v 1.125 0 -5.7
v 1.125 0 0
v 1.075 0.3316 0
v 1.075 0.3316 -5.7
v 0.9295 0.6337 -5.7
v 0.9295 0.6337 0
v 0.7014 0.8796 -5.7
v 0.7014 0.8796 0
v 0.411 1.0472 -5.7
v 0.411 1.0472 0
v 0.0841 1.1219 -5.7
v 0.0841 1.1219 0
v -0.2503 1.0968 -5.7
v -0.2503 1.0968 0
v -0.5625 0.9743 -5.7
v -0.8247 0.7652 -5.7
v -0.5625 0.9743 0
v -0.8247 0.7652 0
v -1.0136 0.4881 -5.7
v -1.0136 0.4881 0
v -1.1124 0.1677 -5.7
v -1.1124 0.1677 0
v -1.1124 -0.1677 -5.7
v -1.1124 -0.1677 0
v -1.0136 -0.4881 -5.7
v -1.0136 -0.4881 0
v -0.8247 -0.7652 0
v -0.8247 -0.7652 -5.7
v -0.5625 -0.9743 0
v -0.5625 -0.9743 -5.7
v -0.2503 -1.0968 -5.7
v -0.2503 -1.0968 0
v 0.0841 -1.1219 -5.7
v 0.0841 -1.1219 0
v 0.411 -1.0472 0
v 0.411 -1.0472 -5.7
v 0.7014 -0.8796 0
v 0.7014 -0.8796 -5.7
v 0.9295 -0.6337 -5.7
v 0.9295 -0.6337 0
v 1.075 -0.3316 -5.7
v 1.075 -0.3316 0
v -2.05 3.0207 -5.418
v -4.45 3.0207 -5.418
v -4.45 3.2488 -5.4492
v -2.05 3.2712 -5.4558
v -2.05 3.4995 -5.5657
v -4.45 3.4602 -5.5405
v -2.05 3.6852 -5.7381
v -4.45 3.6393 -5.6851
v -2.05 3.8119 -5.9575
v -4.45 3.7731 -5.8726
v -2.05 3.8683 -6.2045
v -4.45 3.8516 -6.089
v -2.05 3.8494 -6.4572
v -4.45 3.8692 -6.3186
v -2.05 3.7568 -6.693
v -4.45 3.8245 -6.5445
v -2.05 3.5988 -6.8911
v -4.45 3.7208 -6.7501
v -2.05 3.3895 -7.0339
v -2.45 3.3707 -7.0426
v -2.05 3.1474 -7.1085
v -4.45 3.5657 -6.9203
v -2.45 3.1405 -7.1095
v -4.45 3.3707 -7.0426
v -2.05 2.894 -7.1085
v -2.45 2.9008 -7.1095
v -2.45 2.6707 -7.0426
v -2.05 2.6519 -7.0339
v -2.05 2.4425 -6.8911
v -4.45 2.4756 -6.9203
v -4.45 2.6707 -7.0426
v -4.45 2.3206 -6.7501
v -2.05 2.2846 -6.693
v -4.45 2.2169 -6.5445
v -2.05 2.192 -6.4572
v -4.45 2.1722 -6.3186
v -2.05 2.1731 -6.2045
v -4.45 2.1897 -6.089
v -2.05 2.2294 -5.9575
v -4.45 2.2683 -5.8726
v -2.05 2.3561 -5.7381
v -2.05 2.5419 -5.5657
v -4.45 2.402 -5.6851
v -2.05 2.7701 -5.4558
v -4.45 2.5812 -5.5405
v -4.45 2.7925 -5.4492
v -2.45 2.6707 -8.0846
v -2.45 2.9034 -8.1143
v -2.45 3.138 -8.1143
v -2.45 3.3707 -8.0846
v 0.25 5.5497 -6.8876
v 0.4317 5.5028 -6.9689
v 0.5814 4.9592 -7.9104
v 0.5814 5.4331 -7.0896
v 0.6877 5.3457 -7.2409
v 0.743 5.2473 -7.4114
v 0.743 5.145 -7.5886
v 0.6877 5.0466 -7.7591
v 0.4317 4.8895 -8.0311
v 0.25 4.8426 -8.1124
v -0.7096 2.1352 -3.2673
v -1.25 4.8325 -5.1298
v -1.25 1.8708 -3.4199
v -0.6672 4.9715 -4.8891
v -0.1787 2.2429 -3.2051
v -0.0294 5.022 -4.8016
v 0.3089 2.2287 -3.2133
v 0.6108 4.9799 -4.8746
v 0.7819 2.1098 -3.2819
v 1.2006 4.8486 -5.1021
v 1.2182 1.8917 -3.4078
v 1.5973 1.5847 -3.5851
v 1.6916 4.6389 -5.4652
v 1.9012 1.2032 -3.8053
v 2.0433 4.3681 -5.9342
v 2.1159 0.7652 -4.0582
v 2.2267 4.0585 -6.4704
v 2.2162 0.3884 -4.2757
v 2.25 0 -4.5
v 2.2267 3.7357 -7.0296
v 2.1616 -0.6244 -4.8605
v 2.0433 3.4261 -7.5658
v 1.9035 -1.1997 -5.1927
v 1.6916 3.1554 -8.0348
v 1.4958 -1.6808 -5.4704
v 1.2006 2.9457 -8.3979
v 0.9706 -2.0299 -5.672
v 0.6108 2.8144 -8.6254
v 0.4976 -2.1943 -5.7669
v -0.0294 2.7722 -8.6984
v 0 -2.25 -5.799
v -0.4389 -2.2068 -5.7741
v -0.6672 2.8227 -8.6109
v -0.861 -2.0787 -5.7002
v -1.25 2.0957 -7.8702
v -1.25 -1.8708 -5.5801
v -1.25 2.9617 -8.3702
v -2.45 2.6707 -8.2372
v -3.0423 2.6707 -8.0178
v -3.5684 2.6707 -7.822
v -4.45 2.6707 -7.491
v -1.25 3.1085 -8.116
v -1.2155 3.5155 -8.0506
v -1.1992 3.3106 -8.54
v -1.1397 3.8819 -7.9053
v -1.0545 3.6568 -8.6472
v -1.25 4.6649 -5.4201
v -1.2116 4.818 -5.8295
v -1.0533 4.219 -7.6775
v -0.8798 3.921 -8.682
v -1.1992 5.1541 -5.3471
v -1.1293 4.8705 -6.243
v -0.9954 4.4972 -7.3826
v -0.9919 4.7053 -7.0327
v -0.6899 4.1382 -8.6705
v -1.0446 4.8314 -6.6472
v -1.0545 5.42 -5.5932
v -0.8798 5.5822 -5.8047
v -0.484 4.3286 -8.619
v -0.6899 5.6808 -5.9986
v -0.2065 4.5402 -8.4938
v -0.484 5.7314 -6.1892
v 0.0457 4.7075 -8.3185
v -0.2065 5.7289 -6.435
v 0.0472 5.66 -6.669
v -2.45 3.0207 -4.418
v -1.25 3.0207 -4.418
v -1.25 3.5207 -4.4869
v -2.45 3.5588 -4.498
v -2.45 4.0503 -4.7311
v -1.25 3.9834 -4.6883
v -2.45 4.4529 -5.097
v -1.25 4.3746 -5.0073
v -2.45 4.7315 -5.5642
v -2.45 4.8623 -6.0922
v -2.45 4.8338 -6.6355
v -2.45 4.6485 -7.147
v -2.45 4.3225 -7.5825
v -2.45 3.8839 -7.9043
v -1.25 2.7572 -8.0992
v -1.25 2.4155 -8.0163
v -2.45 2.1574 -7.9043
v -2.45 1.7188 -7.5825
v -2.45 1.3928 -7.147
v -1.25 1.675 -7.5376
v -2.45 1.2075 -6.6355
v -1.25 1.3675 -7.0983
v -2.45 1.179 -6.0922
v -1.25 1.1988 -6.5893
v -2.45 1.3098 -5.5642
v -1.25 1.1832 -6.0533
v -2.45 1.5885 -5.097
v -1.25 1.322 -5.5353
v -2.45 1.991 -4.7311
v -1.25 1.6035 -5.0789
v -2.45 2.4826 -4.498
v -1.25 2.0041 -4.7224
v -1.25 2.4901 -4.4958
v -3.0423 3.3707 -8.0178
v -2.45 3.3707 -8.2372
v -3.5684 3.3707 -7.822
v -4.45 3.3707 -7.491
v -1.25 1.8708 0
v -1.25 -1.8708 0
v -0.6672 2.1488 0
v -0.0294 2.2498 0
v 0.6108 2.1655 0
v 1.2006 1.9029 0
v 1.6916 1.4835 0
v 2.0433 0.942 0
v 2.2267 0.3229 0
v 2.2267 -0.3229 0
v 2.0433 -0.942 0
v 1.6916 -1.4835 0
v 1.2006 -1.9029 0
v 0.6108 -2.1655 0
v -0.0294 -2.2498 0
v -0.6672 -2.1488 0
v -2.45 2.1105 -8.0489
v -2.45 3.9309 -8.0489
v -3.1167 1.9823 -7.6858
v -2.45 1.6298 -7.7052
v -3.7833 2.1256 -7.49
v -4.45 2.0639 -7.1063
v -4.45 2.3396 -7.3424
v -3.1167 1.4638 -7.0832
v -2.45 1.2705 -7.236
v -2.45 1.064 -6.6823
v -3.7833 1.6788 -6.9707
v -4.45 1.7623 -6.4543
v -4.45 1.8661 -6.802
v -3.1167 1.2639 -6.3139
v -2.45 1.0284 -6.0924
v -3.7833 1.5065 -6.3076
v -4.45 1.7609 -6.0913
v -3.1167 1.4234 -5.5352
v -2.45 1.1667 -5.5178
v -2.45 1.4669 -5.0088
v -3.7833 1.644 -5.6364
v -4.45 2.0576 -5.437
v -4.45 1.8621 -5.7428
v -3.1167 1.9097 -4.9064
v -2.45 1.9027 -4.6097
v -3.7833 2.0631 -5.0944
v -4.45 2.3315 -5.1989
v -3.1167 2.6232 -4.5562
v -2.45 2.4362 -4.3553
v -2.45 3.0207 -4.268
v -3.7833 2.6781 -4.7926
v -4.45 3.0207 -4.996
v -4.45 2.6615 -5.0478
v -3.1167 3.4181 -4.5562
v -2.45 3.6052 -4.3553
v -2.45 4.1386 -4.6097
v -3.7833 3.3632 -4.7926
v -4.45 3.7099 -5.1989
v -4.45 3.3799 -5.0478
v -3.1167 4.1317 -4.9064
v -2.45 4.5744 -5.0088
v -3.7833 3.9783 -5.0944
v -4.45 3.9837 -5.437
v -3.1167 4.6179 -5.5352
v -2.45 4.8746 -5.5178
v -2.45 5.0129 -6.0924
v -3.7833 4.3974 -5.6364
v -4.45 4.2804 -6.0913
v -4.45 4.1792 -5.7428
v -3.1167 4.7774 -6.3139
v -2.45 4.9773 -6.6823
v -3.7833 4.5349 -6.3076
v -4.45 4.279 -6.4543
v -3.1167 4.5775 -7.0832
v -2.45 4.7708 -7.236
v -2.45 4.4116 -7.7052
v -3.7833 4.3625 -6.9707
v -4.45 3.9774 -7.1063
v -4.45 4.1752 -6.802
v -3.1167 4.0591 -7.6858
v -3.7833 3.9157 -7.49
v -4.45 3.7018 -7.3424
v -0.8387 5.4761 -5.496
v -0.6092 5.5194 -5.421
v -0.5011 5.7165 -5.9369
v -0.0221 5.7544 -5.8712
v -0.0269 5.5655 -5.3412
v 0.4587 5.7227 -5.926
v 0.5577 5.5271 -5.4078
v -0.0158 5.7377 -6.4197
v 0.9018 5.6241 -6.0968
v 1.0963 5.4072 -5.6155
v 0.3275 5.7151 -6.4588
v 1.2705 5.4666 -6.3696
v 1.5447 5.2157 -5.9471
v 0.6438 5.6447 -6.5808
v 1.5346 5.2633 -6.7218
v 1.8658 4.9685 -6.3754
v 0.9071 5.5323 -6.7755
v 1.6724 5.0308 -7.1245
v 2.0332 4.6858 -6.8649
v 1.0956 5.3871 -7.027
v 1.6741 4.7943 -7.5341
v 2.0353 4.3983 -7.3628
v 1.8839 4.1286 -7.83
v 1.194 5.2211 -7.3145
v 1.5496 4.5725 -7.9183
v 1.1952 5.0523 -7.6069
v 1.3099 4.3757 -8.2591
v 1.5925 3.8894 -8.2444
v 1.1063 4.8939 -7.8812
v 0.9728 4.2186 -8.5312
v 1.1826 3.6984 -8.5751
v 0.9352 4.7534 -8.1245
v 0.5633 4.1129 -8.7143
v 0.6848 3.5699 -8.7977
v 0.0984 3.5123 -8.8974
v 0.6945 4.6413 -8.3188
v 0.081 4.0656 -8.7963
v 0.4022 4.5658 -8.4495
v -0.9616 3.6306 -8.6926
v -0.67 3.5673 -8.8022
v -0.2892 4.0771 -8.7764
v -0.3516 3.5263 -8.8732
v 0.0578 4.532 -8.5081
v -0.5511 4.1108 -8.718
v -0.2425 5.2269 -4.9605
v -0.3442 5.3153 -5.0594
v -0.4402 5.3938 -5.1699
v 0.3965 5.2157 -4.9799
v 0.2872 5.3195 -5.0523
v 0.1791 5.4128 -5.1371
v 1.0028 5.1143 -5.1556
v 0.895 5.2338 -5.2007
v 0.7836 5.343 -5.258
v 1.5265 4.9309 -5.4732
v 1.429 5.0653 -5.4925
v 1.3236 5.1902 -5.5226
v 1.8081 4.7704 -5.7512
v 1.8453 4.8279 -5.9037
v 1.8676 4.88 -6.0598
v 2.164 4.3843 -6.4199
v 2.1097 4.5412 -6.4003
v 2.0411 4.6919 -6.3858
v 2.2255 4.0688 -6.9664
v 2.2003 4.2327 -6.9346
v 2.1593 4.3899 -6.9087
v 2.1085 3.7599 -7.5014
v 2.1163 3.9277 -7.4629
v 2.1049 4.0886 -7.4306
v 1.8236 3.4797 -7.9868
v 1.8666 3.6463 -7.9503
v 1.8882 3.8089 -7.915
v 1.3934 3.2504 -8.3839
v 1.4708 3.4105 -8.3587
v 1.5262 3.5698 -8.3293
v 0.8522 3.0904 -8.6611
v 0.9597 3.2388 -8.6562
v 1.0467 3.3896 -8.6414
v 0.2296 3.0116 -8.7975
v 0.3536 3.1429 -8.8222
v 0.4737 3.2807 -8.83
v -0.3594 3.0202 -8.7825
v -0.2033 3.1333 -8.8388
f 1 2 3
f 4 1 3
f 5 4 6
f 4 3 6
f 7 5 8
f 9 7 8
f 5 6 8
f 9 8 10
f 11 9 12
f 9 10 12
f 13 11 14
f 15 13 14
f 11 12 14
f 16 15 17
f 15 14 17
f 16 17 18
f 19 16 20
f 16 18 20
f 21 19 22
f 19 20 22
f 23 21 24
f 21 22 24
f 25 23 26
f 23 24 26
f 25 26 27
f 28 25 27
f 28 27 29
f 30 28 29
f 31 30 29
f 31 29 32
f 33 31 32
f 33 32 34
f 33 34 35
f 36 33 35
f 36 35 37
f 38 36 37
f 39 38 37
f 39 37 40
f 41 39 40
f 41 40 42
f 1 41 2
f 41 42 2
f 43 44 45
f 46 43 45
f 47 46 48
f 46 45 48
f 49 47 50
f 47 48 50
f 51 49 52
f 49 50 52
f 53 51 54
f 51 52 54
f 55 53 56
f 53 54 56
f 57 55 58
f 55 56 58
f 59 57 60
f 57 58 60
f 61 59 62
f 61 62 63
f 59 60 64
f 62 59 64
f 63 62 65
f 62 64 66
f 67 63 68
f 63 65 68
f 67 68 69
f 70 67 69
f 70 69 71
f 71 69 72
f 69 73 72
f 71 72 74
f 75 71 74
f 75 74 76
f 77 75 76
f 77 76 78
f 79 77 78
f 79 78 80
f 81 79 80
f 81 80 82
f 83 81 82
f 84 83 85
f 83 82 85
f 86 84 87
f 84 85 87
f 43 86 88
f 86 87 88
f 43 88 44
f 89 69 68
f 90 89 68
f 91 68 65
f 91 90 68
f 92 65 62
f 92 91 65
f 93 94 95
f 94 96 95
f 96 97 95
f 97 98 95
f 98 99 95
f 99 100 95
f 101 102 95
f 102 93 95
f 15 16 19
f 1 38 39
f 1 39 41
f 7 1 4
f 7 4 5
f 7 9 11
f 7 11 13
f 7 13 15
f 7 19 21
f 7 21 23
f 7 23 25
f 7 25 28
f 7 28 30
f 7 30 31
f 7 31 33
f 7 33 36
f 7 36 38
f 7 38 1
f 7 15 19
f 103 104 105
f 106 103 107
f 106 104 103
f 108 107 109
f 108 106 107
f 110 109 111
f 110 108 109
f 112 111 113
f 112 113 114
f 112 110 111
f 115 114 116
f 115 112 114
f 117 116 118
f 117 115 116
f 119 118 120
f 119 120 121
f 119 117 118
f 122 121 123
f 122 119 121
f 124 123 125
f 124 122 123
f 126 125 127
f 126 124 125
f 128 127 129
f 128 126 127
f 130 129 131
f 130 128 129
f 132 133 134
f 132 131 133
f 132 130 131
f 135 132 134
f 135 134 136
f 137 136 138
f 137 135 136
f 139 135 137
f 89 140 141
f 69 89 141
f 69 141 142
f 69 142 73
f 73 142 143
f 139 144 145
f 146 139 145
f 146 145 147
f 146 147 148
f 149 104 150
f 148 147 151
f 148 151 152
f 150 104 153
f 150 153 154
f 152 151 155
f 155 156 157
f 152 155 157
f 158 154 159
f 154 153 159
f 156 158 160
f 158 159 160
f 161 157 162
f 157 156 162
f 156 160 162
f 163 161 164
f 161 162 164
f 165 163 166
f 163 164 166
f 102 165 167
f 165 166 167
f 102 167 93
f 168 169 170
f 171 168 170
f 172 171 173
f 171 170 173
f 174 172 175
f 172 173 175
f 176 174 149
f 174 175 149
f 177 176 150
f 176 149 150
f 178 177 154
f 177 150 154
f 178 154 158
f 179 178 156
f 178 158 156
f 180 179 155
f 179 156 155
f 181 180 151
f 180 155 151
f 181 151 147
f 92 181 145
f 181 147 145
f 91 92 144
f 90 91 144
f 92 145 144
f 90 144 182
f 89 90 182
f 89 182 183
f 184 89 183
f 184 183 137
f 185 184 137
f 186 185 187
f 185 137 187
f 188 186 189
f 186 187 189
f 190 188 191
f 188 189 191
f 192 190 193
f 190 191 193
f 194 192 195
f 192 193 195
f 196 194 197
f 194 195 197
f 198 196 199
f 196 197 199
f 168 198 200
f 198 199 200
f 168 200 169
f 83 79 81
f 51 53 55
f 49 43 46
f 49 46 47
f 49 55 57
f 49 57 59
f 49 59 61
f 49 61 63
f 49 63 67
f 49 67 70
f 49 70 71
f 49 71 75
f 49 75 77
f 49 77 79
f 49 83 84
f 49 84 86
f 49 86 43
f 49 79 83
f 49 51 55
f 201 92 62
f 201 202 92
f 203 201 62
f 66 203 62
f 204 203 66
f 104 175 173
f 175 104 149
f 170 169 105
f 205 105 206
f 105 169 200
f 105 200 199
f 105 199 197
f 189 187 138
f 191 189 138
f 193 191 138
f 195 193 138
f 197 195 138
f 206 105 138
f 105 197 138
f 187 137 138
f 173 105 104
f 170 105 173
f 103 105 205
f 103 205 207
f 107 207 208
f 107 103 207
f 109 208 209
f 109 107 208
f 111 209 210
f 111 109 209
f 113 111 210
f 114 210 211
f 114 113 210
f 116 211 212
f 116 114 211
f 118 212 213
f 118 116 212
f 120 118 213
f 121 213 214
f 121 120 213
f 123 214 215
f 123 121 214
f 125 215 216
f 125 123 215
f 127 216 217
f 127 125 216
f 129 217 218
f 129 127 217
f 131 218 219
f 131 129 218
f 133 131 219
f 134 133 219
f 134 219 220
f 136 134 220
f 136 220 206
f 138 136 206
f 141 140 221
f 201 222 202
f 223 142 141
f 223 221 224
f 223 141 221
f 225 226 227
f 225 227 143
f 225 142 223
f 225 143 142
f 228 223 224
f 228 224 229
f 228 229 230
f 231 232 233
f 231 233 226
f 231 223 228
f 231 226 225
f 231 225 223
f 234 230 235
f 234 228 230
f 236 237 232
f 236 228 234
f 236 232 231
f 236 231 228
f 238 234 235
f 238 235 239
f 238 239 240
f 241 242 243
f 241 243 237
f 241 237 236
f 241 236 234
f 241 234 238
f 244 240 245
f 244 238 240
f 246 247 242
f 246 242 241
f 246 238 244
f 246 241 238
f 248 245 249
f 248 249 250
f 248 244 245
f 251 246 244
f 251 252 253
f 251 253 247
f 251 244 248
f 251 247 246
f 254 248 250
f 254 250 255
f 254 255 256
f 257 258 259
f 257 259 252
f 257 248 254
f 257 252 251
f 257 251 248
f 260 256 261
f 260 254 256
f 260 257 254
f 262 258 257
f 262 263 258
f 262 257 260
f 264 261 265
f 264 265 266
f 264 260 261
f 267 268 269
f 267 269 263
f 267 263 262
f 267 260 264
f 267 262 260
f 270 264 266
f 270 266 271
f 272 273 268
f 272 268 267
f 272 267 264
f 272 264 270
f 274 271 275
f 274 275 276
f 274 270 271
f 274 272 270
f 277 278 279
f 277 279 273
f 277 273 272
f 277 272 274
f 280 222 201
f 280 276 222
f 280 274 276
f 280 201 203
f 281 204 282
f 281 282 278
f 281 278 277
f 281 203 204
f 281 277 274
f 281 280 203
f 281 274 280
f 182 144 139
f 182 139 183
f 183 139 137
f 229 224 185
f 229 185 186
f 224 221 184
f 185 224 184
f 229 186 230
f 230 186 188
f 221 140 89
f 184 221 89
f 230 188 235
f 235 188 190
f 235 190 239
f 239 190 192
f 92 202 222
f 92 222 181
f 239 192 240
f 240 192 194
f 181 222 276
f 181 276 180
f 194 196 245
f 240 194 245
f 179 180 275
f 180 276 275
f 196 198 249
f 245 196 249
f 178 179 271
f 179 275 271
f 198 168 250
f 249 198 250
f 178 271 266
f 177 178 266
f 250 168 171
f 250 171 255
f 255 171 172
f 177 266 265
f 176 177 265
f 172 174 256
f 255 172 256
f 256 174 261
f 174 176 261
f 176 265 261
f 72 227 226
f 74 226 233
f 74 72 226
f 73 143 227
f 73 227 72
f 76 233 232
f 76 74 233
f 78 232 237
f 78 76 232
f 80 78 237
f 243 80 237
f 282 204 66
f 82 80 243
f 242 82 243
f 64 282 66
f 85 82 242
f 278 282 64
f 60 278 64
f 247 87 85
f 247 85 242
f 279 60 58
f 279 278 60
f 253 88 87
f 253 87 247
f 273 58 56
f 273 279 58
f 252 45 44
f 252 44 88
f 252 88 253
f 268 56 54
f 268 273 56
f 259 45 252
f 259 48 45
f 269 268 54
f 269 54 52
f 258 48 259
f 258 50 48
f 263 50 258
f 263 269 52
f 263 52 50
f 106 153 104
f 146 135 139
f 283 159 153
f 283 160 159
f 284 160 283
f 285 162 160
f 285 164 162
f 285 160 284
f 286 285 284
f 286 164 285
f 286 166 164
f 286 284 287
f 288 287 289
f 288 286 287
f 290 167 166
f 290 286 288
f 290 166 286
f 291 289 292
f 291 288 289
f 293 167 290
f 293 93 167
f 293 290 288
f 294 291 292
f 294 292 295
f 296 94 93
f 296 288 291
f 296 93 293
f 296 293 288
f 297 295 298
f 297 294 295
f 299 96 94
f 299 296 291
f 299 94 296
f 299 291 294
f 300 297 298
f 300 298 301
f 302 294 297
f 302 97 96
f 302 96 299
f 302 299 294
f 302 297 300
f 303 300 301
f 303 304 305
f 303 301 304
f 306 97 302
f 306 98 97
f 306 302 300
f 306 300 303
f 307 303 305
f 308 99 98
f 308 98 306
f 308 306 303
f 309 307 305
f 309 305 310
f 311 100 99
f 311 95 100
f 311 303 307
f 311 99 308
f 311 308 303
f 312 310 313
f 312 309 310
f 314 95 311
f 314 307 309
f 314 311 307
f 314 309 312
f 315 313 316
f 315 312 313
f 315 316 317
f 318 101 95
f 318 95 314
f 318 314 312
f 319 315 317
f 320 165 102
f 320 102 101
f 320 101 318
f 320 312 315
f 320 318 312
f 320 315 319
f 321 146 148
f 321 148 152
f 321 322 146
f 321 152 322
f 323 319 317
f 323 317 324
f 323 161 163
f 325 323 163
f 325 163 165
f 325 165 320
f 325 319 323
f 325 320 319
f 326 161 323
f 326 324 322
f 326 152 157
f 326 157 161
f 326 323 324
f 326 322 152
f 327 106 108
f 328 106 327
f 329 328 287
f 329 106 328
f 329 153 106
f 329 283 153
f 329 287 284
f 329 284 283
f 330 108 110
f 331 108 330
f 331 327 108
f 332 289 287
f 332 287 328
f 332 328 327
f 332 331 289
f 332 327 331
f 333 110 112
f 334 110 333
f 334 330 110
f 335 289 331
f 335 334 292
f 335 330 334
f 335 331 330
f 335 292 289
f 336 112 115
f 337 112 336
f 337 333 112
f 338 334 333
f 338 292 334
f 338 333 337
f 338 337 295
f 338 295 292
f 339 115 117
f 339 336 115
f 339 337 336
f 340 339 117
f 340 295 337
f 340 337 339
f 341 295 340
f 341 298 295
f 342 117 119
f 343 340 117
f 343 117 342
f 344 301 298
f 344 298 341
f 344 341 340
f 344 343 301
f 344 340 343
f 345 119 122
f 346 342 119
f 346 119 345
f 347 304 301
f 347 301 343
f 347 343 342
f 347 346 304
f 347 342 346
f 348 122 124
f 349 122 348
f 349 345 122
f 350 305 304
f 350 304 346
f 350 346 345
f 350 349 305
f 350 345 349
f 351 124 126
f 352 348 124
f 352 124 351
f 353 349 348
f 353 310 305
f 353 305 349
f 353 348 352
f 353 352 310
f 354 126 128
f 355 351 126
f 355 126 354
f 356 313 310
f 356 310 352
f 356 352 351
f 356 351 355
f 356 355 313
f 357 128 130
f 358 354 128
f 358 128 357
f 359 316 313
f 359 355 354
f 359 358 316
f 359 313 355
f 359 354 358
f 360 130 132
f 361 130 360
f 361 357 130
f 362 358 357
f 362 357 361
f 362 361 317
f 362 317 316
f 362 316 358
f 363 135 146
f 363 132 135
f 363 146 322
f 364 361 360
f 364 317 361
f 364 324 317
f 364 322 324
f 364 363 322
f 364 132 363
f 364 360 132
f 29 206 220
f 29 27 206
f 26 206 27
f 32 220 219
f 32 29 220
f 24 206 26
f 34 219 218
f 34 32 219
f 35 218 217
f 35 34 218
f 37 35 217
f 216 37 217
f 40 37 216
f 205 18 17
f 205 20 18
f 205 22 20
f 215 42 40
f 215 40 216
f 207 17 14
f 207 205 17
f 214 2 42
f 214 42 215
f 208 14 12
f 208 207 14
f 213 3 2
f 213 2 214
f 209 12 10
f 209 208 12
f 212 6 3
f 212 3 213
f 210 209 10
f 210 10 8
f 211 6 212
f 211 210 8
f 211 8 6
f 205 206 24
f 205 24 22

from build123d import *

# Parameters (mm, degrees)
FILLET1_R                       = 1.5
SKETCH3_R                       = 1.125
CUT_EXTRUDE1_DEPTH              = 5.7
SKETCH4_R                       = 1.85
BOSS_EXTRUDE1_DEPTH             = 1.2
BOSS_EXTRUDE1_DIRECTION_2_REACH = 13.17
SKETCH5_R                       = 2
BOSS_EXTRUDE2_DEPTH             = 2
BOSS_EXTRUDE2_TAPER             = 20
SKETCH8_R                       = 0.85
CUT_EXTRUDE2_DEPTH              = 2.4
SKETCH7_W                       = 2
SKETCH7_H                       = 0.7
CUT_EXTRUDE5_DEPTH              = 1.7


with BuildPart() as part:
    # Sweep1: sweep along a path in Sketch2
    with BuildLine(Plane(origin=(0, 0, 0), x_dir=(0, 0, -1), z_dir=(1, 0, 0))) as sweep1_path:
        Line((0, 0), (4.5, 0))
        Line((4.5, 0), (7.5, 5.196152423))
    # Sketch1 → Sweep1 (sweep)
    with BuildSketch(Plane.XY):
        with BuildLine():
            Line((-1.25, 1.870828693), (-1.25, -1.870828693))
            ThreePointArc((-1.25, -1.870828693), (2.25, 0), (-1.25, 1.870828693))
        make_face()
    sweep(path=sweep1_path.line, transition=Transition.RIGHT)

    # Fillet1
    # the kernel refuses this fillet: 1.5 mm, written as the material it takes off along each edge
    with BuildSketch(Plane(origin=(0, 5.196152423, -7.5), x_dir=(-0.9999950652018581, 0.0015707937429397924, 0.0027206945709829077), z_dir=(-0.003141587485879499, -0.4999975326009265, -0.8660211301238867))) as fillet1_piece_1:
        with BuildLine():
            CenterArc((2.25 - FILLET1_R, -FILLET1_R), FILLET1_R, 360, 90)
            Line((2.25 - FILLET1_R, 0), (2.25, 0))
            Line((2.25, 0), (2.25, -FILLET1_R))
        make_face()
    revolve(axis=Axis((0, 5.196152423, -7.5), (0, 0.8660254037844402, -0.49999999999999745)), revolution_arc=359.64, mode=Mode.SUBTRACT)
    with BuildSketch(Plane(origin=(-1.25, 8.006566769, -2.632219561), x_dir=(0, -0.8660254037844399, 0.49999999999999756), z_dir=(0, -0.4999999999999976, -0.86602540378444))) as fillet1_piece_2:
        with BuildLine():
            CenterArc((FILLET1_R, -FILLET1_R), FILLET1_R, 90, 90)
            Line((0, -FILLET1_R), (0, 0))
            Line((0, 0), (FILLET1_R, 0))
        make_face()
    extrude(amount=11.241657387, mode=Mode.SUBTRACT)

    # Sketch3 → Cut-Extrude1 (cut)
    with BuildSketch(Plane.XY):
        Circle(SKETCH3_R)
    extrude(amount=-CUT_EXTRUDE1_DEPTH, mode=Mode.SUBTRACT)

    # Sketch4 → Boss-Extrude1 (add)
    with BuildSketch(Plane.ZY.offset(1.25)):
        with Locations((-6.268038178, 3.020674567)):
            Circle(SKETCH4_R)
    extrude(amount=BOSS_EXTRUDE1_DEPTH)

    # Sketch4 → Boss-Extrude1 direction 2 (add, up to next)
    with BuildSketch(Plane.ZY.offset(1.25), mode=Mode.PRIVATE) as boss_extrude1_direction_2_sk1:
        with Locations((-6.268038178, 3.020674567)):
            Circle(SKETCH4_R)
    boss_extrude1_direction_2_tool1 = extrude(boss_extrude1_direction_2_sk1.sketch, amount=-BOSS_EXTRUDE1_DIRECTION_2_REACH, mode=Mode.PRIVATE) - part.part
    add(boss_extrude1_direction_2_tool1.solids().sort_by_distance((-1.25, 3.020675, -6.268038))[0])

    # Sketch5 → Boss-Extrude2 (add)
    with BuildSketch(Plane.ZY.offset(2.45)):
        with Locations((-6.268038178, 3.020674567)):
            Circle(SKETCH5_R)
    extrude(amount=BOSS_EXTRUDE2_DEPTH, taper=BOSS_EXTRUDE2_TAPER)

    # Sketch8 → Cut-Extrude2 (cut)
    with BuildSketch(Plane.ZY.offset(4.45)):
        with Locations((-6.268038178, 3.020674567)):
            Circle(SKETCH8_R)
    extrude(amount=-CUT_EXTRUDE2_DEPTH, mode=Mode.SUBTRACT)

    # Sketch7 → Cut-Extrude5 (cut, symmetric)
    with BuildSketch(Plane(origin=(0, 0, -8.118038178), x_dir=(-1, 0, 0), z_dir=(0, 0, -1))):
        with Locations((3.45, 3.020674567)):
            Rectangle(SKETCH7_W, SKETCH7_H)
    extrude(amount=CUT_EXTRUDE5_DEPTH, both=True, mode=Mode.SUBTRACT)


solid = part.part
